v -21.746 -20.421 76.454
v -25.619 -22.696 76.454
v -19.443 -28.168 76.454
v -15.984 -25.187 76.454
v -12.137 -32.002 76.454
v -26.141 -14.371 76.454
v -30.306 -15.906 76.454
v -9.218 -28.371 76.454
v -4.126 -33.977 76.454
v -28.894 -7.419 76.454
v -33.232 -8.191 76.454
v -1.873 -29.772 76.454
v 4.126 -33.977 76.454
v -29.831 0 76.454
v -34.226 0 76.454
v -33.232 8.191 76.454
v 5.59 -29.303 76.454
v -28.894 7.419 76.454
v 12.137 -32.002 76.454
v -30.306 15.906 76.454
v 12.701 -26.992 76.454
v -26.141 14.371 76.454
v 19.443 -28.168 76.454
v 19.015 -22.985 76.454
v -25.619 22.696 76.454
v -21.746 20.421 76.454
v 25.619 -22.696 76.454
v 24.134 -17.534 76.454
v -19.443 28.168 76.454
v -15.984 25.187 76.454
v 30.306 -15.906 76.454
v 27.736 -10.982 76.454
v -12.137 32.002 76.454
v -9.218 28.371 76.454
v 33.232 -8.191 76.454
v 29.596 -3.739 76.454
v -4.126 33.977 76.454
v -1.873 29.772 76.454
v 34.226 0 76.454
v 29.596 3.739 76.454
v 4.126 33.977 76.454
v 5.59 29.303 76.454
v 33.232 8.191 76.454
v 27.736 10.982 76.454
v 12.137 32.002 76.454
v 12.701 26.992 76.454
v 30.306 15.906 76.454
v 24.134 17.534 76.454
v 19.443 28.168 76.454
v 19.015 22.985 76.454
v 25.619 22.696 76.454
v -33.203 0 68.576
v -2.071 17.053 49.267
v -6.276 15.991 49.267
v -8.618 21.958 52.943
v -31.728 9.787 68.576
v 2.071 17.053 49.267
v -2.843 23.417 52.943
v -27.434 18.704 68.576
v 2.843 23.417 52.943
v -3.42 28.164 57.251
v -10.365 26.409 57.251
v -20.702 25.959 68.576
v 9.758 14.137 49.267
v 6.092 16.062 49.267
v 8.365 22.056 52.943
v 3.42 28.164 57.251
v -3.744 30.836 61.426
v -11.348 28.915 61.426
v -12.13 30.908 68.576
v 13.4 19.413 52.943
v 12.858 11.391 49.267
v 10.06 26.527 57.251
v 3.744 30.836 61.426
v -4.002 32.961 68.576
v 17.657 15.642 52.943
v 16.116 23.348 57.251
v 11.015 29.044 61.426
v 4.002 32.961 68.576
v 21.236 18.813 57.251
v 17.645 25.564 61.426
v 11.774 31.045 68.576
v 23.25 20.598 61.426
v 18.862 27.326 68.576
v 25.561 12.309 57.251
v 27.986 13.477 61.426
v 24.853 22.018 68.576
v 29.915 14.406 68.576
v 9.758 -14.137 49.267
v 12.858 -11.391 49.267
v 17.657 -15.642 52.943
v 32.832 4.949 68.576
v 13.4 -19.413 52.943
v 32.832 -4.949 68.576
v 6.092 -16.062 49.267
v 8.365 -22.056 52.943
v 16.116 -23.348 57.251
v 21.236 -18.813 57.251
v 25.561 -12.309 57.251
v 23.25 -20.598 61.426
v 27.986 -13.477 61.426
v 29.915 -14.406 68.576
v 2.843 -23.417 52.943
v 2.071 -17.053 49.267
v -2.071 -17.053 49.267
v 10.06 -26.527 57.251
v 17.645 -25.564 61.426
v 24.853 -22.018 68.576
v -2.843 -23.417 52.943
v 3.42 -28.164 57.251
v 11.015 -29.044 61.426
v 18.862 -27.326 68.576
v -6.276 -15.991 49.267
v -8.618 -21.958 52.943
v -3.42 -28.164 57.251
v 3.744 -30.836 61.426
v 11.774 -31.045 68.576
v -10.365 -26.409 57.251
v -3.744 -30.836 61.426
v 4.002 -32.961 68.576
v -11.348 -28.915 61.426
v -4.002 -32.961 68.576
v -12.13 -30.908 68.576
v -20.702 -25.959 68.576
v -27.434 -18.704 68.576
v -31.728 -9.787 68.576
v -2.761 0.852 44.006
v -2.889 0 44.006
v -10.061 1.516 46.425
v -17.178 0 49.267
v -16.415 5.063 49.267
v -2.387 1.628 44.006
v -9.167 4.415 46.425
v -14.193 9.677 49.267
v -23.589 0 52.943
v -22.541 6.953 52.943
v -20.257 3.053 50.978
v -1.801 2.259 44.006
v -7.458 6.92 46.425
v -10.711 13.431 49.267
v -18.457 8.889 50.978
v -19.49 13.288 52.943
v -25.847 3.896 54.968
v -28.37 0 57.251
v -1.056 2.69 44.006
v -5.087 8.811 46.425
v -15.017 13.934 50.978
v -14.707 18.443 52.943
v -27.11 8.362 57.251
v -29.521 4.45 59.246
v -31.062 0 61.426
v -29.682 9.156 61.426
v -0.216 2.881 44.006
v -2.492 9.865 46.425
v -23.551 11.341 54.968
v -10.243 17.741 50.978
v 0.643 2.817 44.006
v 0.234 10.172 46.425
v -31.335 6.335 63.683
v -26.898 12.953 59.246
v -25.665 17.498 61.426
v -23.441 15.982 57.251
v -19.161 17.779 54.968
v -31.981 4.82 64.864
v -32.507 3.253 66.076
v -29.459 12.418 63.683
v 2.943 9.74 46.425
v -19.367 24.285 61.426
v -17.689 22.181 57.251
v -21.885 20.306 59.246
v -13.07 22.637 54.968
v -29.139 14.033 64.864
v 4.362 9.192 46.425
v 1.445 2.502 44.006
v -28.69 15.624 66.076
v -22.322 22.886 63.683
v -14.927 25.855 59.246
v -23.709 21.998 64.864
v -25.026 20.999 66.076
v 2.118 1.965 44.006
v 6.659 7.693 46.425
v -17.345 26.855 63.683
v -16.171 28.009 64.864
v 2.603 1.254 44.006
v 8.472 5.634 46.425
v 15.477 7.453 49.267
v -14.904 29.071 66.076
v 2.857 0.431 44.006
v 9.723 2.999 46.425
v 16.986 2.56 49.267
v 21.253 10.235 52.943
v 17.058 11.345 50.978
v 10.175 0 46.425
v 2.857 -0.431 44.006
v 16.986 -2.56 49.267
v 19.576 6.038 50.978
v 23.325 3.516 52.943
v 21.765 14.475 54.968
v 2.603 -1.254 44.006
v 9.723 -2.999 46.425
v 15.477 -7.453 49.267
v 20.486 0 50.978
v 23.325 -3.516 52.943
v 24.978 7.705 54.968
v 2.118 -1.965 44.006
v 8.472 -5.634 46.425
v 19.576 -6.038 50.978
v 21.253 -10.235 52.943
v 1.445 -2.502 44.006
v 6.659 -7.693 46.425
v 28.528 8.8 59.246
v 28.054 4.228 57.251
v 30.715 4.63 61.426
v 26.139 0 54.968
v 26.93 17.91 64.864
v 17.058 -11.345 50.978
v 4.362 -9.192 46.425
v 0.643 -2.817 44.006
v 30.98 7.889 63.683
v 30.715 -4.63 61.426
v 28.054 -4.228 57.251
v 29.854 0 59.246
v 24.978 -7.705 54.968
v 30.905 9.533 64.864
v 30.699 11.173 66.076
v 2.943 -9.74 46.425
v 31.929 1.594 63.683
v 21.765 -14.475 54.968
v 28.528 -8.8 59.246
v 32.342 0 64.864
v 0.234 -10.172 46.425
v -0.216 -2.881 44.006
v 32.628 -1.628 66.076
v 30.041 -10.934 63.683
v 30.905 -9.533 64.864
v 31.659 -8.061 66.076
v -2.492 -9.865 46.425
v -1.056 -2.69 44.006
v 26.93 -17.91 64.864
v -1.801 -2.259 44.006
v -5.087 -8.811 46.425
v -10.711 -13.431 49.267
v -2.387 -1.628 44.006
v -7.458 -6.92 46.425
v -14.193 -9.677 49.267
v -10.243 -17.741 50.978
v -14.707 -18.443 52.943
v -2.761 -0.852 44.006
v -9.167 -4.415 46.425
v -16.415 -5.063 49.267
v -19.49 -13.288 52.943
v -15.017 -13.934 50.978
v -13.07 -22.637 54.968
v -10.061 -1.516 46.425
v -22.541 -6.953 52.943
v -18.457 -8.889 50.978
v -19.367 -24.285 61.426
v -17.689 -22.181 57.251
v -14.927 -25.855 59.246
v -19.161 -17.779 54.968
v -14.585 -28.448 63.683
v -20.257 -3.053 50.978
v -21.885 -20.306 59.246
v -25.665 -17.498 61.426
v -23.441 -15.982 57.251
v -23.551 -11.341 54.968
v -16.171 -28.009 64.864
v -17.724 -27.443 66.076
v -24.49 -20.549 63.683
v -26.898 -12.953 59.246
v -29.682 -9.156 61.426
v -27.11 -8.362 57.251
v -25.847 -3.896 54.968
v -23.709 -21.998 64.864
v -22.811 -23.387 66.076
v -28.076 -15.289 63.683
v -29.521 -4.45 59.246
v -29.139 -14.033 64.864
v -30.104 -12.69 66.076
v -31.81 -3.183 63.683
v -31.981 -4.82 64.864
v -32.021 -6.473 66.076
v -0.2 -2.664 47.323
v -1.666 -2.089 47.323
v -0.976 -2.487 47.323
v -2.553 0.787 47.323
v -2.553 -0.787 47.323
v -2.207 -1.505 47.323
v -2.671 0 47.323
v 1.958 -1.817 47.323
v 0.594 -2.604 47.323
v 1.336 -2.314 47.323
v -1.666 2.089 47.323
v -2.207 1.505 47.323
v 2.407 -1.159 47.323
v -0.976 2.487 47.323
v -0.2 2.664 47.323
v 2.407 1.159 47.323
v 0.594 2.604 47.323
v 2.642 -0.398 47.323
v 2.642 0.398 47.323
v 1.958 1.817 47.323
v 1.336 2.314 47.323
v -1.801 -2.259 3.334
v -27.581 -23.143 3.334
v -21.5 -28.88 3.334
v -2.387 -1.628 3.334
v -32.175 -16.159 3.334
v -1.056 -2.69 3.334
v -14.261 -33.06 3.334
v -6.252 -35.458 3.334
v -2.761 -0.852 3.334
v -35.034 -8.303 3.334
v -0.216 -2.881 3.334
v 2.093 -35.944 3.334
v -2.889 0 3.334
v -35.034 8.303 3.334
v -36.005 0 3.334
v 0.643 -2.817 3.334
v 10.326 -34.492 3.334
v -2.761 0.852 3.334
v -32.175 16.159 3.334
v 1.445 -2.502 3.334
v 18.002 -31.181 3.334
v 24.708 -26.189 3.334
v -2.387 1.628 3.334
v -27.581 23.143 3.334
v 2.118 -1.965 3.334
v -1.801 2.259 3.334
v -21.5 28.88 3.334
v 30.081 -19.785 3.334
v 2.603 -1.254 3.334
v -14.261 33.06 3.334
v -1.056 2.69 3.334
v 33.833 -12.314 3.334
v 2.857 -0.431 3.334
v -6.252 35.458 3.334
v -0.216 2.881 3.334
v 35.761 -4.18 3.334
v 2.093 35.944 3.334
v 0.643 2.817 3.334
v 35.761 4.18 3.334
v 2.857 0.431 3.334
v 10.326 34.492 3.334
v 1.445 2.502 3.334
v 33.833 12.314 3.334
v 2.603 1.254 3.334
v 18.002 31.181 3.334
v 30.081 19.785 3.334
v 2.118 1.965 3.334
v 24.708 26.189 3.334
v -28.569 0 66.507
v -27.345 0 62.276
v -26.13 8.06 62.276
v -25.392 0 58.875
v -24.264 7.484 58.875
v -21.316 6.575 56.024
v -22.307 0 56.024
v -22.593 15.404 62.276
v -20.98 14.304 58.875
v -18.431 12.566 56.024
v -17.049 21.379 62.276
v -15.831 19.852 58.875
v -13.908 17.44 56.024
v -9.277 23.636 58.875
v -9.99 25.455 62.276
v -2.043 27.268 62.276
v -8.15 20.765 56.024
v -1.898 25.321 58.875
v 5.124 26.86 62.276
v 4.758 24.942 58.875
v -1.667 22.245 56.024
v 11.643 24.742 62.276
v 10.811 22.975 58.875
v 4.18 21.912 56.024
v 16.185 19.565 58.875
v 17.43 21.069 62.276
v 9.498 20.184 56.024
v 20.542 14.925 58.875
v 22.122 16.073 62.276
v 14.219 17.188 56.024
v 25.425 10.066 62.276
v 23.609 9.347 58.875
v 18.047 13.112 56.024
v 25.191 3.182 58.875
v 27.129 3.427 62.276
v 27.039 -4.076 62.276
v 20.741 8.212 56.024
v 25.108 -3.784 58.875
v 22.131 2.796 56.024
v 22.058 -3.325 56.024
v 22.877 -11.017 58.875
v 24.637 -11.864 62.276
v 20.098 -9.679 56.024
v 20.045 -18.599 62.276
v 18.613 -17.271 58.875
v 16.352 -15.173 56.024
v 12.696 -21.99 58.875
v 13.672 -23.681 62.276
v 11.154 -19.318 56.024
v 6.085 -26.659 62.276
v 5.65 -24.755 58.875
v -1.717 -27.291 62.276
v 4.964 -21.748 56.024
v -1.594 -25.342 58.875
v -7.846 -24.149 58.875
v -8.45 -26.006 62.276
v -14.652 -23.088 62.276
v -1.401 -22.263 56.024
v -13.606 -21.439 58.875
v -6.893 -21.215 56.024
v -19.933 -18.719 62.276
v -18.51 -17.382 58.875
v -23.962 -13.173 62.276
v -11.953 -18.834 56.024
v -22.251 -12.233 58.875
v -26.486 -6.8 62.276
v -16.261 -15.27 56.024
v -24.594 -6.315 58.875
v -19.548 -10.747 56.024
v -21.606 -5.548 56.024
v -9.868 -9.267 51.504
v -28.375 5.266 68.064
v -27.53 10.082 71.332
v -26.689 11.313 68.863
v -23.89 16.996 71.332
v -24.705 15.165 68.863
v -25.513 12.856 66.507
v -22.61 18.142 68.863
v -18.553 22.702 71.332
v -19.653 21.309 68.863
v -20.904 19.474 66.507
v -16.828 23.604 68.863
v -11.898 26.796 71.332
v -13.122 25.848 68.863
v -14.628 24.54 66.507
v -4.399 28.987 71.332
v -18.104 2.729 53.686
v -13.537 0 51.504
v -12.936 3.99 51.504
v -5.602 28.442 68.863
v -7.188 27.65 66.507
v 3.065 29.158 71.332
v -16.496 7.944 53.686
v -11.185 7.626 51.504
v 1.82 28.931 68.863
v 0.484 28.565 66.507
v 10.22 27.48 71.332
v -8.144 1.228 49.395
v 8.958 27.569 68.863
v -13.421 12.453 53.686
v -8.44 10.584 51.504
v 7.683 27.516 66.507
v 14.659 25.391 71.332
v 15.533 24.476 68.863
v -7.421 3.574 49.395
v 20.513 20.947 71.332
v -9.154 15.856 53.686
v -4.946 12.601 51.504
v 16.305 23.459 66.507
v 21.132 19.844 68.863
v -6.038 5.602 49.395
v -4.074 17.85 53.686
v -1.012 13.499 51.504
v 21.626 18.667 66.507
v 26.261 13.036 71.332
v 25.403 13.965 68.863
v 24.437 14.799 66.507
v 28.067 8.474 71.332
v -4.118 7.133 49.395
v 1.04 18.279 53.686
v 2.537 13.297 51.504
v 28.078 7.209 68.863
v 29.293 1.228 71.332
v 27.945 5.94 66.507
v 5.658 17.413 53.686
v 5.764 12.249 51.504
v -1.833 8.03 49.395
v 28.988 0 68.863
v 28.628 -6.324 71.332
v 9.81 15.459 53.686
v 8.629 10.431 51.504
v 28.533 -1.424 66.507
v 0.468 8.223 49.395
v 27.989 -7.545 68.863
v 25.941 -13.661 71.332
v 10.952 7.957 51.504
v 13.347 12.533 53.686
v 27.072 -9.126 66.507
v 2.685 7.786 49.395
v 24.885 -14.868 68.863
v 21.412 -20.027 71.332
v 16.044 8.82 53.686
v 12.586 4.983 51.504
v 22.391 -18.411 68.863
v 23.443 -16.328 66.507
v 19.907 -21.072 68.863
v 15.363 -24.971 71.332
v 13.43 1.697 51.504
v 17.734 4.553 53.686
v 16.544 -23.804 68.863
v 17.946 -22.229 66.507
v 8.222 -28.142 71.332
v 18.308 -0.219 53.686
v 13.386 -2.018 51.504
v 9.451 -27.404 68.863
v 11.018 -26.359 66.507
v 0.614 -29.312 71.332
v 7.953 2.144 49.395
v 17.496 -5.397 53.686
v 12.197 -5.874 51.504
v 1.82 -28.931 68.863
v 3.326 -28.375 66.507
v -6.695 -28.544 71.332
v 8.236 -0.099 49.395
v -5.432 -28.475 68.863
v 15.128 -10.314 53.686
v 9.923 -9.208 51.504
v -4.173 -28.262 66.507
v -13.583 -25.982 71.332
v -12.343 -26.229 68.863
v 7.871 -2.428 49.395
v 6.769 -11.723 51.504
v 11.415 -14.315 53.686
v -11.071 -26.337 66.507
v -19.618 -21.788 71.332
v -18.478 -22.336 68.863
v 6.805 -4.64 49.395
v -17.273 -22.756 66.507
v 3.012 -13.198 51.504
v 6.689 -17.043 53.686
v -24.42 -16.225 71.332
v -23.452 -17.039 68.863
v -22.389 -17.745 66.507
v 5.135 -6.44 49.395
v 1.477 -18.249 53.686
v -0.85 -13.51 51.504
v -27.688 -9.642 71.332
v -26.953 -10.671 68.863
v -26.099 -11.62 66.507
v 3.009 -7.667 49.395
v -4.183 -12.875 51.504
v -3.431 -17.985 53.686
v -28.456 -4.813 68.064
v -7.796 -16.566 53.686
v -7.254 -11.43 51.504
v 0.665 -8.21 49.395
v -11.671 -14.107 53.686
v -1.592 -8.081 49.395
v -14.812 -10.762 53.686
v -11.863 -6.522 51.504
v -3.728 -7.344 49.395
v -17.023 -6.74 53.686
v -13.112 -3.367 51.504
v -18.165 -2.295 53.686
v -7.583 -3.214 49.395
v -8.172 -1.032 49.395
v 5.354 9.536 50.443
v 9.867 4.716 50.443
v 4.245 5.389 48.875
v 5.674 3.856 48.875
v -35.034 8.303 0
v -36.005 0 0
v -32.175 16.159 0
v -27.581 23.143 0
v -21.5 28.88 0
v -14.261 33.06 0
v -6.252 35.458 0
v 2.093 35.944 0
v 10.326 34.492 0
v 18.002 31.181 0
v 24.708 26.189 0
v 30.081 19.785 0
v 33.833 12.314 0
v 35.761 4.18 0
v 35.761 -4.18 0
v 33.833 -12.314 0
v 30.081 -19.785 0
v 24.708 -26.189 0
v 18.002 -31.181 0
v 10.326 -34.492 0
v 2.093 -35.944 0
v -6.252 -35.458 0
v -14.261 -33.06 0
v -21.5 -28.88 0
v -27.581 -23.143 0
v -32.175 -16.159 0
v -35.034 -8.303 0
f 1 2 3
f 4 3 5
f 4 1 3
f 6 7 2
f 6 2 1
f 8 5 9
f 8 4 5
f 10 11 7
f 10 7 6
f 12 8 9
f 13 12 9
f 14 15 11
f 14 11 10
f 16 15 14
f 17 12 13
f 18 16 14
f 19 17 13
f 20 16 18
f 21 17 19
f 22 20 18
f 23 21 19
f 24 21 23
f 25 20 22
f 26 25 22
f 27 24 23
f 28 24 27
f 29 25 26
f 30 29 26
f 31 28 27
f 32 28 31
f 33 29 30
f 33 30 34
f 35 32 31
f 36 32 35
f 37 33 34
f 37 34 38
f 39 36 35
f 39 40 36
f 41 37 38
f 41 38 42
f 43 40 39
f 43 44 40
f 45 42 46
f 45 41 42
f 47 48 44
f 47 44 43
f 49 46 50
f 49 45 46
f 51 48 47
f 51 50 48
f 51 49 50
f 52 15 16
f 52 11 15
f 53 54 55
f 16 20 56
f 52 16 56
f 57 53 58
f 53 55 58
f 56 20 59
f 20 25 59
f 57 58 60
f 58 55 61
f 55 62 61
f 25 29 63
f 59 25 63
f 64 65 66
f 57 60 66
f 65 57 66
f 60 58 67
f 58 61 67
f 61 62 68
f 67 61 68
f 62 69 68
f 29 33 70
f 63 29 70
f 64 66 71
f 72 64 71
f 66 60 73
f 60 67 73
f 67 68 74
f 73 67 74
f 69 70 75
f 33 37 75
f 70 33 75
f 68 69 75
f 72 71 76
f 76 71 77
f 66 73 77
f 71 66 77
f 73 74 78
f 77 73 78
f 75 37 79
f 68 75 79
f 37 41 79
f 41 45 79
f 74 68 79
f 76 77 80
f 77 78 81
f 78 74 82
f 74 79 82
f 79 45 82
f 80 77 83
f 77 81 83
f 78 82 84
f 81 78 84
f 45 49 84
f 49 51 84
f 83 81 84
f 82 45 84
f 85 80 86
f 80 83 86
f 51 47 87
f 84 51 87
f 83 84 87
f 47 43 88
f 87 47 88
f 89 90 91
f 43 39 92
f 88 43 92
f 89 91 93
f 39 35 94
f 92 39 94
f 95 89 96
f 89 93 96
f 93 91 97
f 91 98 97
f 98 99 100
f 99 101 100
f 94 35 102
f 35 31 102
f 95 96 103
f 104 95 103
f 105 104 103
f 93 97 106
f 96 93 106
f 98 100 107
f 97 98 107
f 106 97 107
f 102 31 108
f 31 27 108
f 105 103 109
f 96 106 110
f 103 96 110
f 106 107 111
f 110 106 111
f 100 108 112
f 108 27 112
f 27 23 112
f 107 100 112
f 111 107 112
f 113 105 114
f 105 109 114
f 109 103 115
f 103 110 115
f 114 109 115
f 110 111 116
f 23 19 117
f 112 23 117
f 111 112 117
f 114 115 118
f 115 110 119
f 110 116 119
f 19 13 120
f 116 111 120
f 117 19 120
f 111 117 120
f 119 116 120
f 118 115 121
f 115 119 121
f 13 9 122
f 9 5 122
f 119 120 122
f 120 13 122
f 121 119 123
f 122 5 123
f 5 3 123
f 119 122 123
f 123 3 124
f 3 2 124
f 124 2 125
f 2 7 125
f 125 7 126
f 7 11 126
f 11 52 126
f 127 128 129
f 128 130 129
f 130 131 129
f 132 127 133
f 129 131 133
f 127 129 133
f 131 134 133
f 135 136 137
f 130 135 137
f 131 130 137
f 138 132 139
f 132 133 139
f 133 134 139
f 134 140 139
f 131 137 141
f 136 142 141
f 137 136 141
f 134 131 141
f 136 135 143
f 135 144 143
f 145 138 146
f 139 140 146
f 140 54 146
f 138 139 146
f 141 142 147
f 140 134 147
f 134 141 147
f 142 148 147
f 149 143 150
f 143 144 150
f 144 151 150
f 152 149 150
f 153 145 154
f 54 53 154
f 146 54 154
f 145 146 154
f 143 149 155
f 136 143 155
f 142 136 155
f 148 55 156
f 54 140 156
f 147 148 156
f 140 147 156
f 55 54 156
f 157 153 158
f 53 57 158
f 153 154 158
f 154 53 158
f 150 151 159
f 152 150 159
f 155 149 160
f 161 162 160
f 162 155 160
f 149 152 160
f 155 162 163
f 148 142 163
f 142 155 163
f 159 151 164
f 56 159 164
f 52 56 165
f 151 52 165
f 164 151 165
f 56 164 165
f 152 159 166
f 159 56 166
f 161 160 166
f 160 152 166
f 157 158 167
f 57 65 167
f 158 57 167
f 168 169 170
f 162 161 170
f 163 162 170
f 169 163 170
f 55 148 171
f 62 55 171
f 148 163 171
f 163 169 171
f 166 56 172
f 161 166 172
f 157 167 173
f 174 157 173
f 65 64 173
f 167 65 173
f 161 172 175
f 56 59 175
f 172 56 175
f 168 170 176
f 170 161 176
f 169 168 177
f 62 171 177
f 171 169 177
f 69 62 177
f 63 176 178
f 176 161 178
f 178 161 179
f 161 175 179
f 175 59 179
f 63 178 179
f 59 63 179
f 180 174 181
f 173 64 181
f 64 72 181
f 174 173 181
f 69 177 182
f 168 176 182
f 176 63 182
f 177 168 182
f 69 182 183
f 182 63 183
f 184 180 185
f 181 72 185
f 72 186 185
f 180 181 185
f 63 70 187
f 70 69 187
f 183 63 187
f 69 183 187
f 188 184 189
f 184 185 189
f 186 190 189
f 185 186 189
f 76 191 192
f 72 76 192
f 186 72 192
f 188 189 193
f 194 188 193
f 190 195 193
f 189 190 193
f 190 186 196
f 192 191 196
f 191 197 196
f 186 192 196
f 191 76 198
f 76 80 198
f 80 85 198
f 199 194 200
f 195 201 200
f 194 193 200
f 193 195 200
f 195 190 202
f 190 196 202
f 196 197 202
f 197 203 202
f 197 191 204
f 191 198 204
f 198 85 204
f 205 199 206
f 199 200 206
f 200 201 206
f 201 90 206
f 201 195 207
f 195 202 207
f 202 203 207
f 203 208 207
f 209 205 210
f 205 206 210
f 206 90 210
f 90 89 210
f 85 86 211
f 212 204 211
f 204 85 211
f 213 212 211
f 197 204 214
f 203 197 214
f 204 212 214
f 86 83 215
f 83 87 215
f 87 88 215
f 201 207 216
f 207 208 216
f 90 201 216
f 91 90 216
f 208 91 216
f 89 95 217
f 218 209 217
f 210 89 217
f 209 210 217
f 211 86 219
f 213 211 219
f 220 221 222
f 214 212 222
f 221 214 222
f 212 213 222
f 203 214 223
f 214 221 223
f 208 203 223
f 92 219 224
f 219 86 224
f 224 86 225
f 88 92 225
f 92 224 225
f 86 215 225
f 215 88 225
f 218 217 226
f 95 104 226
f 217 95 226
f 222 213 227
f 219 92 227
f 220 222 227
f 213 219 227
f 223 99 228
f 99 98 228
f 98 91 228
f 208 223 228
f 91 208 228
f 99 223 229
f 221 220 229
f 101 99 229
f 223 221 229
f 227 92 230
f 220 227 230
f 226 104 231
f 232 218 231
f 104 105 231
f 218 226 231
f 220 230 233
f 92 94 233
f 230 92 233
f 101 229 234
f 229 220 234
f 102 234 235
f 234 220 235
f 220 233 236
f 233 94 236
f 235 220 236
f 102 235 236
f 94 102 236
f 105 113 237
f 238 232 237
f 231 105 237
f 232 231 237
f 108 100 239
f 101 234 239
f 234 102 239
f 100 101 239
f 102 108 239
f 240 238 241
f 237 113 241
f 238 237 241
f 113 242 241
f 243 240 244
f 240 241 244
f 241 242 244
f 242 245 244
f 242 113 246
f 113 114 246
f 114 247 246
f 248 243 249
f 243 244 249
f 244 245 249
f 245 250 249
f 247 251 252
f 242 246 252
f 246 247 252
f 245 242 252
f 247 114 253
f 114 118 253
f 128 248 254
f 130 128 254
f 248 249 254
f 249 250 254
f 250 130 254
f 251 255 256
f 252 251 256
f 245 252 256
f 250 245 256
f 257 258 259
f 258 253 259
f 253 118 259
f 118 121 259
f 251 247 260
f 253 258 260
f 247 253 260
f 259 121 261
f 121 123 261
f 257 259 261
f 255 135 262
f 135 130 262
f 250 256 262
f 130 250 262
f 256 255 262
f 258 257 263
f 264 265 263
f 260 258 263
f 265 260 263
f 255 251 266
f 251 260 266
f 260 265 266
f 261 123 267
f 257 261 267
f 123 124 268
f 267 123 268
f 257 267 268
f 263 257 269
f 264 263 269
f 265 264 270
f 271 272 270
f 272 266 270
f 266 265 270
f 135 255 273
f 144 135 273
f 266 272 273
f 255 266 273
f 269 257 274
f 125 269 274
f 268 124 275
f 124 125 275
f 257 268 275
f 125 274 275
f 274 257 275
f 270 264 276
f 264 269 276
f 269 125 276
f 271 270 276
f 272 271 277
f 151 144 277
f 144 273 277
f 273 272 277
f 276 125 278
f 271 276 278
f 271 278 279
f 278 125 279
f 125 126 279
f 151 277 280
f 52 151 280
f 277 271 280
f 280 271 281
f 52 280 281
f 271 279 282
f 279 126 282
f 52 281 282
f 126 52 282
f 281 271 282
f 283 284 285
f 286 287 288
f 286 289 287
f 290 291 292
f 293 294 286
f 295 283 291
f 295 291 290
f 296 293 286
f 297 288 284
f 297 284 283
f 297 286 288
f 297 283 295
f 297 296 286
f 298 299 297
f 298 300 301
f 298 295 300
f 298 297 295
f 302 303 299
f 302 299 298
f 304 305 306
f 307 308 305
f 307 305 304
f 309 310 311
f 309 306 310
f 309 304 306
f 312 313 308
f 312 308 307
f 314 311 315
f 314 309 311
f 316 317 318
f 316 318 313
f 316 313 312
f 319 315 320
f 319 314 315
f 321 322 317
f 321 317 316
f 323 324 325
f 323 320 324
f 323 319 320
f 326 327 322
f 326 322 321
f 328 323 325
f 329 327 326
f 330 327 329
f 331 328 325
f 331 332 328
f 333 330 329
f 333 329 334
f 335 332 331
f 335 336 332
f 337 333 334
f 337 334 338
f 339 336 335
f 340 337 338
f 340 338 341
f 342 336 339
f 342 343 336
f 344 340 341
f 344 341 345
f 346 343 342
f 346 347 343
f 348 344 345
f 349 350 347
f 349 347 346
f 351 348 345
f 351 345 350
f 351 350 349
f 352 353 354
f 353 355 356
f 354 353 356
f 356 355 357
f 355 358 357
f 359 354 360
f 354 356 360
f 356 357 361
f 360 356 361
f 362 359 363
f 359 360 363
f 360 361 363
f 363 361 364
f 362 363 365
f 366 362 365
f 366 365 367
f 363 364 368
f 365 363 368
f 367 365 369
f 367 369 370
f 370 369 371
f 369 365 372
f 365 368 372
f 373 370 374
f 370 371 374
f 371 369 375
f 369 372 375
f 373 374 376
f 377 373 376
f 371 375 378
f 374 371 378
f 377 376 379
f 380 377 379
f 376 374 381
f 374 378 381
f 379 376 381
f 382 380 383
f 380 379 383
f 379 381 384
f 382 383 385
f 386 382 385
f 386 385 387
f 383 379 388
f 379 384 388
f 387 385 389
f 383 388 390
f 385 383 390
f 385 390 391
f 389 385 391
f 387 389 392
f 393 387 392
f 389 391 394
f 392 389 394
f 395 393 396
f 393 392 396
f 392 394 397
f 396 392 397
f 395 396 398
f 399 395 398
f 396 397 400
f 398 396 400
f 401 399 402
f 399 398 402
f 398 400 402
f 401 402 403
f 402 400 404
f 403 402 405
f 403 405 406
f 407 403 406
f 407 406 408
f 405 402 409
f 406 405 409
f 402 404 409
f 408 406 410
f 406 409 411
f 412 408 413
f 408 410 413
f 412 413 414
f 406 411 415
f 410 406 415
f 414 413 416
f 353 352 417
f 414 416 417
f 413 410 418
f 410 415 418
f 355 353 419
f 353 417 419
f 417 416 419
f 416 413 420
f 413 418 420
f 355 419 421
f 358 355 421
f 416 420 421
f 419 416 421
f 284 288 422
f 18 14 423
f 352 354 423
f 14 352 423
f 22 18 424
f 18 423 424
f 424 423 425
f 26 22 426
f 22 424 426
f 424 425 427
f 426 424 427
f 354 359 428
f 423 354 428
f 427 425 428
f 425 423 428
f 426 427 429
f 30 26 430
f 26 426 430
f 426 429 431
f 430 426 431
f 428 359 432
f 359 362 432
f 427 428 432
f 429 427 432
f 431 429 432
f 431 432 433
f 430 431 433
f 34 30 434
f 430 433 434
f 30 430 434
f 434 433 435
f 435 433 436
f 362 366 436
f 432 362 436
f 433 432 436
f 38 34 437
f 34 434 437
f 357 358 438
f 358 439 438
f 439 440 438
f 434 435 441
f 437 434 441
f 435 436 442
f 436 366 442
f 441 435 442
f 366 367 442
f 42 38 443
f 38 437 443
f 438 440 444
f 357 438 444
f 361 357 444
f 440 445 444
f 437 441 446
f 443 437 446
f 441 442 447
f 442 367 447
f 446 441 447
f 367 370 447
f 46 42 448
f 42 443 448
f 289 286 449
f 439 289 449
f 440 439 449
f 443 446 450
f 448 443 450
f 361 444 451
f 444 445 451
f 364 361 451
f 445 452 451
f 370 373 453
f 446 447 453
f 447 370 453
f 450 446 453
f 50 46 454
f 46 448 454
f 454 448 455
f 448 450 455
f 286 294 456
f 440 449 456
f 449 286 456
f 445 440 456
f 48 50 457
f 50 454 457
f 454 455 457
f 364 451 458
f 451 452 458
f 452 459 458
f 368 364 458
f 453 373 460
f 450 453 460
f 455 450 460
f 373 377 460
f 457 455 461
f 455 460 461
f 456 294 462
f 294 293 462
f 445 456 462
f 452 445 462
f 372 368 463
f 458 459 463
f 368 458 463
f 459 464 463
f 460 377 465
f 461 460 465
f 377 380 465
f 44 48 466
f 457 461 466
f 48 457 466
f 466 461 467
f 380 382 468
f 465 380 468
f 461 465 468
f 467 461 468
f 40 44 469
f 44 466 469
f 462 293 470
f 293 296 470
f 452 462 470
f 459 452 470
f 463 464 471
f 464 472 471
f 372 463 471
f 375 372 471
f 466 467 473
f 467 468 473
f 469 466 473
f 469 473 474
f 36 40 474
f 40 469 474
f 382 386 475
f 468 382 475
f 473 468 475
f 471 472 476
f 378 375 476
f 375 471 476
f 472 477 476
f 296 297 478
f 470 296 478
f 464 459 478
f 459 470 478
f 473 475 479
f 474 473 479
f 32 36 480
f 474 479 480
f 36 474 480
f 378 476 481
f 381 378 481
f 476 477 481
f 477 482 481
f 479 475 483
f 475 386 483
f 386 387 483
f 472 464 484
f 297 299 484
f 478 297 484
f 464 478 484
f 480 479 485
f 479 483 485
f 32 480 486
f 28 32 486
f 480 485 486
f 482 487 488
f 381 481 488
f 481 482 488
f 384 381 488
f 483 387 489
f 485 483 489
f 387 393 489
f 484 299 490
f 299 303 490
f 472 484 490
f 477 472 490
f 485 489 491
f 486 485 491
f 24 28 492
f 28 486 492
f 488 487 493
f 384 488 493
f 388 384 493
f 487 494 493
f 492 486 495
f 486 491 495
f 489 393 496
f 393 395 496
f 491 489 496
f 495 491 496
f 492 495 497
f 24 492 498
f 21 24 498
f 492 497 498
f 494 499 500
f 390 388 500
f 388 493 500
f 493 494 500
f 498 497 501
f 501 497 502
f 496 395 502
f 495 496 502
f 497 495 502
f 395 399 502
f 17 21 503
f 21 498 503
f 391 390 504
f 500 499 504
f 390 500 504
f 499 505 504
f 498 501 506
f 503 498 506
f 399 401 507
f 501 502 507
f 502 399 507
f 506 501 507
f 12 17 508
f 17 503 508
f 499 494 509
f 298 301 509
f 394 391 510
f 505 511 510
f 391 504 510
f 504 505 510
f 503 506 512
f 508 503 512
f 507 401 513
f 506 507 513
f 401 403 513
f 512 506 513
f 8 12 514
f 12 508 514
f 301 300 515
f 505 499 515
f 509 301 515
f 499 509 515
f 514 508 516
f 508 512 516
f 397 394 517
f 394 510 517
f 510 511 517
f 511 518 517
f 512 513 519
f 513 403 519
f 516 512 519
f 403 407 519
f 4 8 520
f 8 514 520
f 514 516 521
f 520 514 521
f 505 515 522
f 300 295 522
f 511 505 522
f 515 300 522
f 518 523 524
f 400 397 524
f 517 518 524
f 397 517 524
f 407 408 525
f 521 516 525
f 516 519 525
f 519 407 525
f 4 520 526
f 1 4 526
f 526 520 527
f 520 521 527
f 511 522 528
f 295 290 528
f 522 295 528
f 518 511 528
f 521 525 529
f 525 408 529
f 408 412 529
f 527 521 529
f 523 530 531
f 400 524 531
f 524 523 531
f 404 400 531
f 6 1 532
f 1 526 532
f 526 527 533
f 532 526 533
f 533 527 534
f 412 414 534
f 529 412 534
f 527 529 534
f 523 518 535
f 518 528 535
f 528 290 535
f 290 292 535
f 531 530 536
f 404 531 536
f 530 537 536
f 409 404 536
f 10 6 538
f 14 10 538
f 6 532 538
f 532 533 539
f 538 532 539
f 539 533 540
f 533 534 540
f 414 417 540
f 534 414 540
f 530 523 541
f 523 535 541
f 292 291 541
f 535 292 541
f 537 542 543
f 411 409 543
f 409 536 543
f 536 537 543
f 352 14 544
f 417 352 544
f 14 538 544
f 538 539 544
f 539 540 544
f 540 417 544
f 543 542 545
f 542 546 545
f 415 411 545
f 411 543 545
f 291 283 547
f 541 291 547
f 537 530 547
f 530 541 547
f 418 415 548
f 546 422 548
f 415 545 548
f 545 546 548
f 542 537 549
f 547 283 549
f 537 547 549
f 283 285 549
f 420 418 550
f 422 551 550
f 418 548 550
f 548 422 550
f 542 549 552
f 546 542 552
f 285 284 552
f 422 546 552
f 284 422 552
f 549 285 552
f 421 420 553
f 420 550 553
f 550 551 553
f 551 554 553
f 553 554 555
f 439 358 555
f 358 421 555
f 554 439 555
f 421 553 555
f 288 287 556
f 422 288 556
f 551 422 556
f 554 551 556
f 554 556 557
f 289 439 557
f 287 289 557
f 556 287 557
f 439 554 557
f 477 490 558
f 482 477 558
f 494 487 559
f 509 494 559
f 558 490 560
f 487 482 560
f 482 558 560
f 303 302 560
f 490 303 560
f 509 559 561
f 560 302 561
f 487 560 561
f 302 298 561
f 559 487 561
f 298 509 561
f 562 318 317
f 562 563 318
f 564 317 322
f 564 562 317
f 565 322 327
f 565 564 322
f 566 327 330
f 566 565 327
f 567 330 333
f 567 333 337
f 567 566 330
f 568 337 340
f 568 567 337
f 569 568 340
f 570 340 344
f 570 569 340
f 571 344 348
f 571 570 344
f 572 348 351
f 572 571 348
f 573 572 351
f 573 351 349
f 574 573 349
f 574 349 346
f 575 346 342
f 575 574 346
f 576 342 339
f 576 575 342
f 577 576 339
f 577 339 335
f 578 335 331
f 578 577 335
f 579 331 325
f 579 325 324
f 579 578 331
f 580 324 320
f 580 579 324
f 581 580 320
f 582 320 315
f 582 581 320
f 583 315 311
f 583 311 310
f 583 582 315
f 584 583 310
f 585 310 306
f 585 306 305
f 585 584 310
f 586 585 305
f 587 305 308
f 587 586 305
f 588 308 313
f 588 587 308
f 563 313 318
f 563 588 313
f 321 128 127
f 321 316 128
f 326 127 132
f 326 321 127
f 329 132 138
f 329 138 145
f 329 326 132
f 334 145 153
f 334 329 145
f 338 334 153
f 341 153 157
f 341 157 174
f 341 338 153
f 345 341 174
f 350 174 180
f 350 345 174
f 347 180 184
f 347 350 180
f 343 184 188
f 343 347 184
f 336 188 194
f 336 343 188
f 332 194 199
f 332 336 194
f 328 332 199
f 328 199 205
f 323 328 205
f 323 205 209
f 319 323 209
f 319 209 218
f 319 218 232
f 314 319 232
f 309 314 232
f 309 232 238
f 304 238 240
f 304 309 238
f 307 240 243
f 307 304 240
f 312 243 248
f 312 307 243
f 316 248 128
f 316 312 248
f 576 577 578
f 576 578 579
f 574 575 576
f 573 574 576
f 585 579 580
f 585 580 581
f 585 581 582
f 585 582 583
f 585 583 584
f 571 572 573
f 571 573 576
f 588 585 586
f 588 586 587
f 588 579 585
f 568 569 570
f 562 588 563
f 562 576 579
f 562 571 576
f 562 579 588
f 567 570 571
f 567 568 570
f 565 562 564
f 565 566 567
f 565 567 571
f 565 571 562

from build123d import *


with BuildPart() as f1:
    # F0 (on Front) → F1 (revolve)
    with BuildSketch(Plane.XZ):
        with BuildLine():
            Line((-36.0045023263, 0), (0, 0))
            Line((0, 0), (0, 47.3225265741))
            Line((0, 47.3225265741), (-2.6714450214, 47.3225265741))
            add(Edge.make_bspline(
                [(-29.8311356455, 76.4539986849), (-29.2989716649, 70.6352231057), (-28.3357085084, 60.1027324923), (-18.9353962678, 53.3152355224), (-8.5435942404, 49.4862124237), (-2.6714450214, 47.3225265741)],
                knots=[0, 0, 0, 0, 0.3493338694, 0.6323247305, 1, 1, 1, 1], degree=3))
            Line((-29.8311356455, 76.4539986849), (-34.2264994979, 76.4539986849))
            add(Edge.make_bspline(
                [(-2.889250638, 44.0055020154), (-8.4850245518, 45.7981994756), (-19.2999270625, 49.2629299243), (-32.4249567616, 59.2377059697), (-33.616342724, 70.6230864285), (-34.2264994979, 76.4539986849)],
                knots=[0, 0, 0, 0, 0.3434299501, 0.6637440123, 1, 1, 1, 1], degree=3))
            Line((-2.889250638, 44.0055020154), (-2.889250638, 3.3337501809))
            Line((-2.889250638, 3.3337501809), (-36.0045023263, 3.3337501809))
            Line((-36.0045023263, 3.3337501809), (-36.0045023263, 0))
        make_face()
    revolve(axis=Axis((0, 0, 23.6612632871), (0, 0, -1)))


solid = f1.part
